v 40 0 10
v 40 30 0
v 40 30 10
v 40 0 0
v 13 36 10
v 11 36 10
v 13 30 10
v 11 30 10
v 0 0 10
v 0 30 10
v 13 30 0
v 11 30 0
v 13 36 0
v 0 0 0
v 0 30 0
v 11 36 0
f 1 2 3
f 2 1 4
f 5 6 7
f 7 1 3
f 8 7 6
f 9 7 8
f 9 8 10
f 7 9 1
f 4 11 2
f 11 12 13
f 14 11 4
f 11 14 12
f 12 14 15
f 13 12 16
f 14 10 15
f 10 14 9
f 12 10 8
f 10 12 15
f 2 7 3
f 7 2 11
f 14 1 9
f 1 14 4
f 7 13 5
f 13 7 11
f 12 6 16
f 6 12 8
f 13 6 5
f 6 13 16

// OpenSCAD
// units=mm — generated by scad_emitter.py
// part=unnamed
$fn = 48;

union() { cube([40, 30, 10]); translate([11, 29.5, 0]) cube([2, 6.5, 10]); }
